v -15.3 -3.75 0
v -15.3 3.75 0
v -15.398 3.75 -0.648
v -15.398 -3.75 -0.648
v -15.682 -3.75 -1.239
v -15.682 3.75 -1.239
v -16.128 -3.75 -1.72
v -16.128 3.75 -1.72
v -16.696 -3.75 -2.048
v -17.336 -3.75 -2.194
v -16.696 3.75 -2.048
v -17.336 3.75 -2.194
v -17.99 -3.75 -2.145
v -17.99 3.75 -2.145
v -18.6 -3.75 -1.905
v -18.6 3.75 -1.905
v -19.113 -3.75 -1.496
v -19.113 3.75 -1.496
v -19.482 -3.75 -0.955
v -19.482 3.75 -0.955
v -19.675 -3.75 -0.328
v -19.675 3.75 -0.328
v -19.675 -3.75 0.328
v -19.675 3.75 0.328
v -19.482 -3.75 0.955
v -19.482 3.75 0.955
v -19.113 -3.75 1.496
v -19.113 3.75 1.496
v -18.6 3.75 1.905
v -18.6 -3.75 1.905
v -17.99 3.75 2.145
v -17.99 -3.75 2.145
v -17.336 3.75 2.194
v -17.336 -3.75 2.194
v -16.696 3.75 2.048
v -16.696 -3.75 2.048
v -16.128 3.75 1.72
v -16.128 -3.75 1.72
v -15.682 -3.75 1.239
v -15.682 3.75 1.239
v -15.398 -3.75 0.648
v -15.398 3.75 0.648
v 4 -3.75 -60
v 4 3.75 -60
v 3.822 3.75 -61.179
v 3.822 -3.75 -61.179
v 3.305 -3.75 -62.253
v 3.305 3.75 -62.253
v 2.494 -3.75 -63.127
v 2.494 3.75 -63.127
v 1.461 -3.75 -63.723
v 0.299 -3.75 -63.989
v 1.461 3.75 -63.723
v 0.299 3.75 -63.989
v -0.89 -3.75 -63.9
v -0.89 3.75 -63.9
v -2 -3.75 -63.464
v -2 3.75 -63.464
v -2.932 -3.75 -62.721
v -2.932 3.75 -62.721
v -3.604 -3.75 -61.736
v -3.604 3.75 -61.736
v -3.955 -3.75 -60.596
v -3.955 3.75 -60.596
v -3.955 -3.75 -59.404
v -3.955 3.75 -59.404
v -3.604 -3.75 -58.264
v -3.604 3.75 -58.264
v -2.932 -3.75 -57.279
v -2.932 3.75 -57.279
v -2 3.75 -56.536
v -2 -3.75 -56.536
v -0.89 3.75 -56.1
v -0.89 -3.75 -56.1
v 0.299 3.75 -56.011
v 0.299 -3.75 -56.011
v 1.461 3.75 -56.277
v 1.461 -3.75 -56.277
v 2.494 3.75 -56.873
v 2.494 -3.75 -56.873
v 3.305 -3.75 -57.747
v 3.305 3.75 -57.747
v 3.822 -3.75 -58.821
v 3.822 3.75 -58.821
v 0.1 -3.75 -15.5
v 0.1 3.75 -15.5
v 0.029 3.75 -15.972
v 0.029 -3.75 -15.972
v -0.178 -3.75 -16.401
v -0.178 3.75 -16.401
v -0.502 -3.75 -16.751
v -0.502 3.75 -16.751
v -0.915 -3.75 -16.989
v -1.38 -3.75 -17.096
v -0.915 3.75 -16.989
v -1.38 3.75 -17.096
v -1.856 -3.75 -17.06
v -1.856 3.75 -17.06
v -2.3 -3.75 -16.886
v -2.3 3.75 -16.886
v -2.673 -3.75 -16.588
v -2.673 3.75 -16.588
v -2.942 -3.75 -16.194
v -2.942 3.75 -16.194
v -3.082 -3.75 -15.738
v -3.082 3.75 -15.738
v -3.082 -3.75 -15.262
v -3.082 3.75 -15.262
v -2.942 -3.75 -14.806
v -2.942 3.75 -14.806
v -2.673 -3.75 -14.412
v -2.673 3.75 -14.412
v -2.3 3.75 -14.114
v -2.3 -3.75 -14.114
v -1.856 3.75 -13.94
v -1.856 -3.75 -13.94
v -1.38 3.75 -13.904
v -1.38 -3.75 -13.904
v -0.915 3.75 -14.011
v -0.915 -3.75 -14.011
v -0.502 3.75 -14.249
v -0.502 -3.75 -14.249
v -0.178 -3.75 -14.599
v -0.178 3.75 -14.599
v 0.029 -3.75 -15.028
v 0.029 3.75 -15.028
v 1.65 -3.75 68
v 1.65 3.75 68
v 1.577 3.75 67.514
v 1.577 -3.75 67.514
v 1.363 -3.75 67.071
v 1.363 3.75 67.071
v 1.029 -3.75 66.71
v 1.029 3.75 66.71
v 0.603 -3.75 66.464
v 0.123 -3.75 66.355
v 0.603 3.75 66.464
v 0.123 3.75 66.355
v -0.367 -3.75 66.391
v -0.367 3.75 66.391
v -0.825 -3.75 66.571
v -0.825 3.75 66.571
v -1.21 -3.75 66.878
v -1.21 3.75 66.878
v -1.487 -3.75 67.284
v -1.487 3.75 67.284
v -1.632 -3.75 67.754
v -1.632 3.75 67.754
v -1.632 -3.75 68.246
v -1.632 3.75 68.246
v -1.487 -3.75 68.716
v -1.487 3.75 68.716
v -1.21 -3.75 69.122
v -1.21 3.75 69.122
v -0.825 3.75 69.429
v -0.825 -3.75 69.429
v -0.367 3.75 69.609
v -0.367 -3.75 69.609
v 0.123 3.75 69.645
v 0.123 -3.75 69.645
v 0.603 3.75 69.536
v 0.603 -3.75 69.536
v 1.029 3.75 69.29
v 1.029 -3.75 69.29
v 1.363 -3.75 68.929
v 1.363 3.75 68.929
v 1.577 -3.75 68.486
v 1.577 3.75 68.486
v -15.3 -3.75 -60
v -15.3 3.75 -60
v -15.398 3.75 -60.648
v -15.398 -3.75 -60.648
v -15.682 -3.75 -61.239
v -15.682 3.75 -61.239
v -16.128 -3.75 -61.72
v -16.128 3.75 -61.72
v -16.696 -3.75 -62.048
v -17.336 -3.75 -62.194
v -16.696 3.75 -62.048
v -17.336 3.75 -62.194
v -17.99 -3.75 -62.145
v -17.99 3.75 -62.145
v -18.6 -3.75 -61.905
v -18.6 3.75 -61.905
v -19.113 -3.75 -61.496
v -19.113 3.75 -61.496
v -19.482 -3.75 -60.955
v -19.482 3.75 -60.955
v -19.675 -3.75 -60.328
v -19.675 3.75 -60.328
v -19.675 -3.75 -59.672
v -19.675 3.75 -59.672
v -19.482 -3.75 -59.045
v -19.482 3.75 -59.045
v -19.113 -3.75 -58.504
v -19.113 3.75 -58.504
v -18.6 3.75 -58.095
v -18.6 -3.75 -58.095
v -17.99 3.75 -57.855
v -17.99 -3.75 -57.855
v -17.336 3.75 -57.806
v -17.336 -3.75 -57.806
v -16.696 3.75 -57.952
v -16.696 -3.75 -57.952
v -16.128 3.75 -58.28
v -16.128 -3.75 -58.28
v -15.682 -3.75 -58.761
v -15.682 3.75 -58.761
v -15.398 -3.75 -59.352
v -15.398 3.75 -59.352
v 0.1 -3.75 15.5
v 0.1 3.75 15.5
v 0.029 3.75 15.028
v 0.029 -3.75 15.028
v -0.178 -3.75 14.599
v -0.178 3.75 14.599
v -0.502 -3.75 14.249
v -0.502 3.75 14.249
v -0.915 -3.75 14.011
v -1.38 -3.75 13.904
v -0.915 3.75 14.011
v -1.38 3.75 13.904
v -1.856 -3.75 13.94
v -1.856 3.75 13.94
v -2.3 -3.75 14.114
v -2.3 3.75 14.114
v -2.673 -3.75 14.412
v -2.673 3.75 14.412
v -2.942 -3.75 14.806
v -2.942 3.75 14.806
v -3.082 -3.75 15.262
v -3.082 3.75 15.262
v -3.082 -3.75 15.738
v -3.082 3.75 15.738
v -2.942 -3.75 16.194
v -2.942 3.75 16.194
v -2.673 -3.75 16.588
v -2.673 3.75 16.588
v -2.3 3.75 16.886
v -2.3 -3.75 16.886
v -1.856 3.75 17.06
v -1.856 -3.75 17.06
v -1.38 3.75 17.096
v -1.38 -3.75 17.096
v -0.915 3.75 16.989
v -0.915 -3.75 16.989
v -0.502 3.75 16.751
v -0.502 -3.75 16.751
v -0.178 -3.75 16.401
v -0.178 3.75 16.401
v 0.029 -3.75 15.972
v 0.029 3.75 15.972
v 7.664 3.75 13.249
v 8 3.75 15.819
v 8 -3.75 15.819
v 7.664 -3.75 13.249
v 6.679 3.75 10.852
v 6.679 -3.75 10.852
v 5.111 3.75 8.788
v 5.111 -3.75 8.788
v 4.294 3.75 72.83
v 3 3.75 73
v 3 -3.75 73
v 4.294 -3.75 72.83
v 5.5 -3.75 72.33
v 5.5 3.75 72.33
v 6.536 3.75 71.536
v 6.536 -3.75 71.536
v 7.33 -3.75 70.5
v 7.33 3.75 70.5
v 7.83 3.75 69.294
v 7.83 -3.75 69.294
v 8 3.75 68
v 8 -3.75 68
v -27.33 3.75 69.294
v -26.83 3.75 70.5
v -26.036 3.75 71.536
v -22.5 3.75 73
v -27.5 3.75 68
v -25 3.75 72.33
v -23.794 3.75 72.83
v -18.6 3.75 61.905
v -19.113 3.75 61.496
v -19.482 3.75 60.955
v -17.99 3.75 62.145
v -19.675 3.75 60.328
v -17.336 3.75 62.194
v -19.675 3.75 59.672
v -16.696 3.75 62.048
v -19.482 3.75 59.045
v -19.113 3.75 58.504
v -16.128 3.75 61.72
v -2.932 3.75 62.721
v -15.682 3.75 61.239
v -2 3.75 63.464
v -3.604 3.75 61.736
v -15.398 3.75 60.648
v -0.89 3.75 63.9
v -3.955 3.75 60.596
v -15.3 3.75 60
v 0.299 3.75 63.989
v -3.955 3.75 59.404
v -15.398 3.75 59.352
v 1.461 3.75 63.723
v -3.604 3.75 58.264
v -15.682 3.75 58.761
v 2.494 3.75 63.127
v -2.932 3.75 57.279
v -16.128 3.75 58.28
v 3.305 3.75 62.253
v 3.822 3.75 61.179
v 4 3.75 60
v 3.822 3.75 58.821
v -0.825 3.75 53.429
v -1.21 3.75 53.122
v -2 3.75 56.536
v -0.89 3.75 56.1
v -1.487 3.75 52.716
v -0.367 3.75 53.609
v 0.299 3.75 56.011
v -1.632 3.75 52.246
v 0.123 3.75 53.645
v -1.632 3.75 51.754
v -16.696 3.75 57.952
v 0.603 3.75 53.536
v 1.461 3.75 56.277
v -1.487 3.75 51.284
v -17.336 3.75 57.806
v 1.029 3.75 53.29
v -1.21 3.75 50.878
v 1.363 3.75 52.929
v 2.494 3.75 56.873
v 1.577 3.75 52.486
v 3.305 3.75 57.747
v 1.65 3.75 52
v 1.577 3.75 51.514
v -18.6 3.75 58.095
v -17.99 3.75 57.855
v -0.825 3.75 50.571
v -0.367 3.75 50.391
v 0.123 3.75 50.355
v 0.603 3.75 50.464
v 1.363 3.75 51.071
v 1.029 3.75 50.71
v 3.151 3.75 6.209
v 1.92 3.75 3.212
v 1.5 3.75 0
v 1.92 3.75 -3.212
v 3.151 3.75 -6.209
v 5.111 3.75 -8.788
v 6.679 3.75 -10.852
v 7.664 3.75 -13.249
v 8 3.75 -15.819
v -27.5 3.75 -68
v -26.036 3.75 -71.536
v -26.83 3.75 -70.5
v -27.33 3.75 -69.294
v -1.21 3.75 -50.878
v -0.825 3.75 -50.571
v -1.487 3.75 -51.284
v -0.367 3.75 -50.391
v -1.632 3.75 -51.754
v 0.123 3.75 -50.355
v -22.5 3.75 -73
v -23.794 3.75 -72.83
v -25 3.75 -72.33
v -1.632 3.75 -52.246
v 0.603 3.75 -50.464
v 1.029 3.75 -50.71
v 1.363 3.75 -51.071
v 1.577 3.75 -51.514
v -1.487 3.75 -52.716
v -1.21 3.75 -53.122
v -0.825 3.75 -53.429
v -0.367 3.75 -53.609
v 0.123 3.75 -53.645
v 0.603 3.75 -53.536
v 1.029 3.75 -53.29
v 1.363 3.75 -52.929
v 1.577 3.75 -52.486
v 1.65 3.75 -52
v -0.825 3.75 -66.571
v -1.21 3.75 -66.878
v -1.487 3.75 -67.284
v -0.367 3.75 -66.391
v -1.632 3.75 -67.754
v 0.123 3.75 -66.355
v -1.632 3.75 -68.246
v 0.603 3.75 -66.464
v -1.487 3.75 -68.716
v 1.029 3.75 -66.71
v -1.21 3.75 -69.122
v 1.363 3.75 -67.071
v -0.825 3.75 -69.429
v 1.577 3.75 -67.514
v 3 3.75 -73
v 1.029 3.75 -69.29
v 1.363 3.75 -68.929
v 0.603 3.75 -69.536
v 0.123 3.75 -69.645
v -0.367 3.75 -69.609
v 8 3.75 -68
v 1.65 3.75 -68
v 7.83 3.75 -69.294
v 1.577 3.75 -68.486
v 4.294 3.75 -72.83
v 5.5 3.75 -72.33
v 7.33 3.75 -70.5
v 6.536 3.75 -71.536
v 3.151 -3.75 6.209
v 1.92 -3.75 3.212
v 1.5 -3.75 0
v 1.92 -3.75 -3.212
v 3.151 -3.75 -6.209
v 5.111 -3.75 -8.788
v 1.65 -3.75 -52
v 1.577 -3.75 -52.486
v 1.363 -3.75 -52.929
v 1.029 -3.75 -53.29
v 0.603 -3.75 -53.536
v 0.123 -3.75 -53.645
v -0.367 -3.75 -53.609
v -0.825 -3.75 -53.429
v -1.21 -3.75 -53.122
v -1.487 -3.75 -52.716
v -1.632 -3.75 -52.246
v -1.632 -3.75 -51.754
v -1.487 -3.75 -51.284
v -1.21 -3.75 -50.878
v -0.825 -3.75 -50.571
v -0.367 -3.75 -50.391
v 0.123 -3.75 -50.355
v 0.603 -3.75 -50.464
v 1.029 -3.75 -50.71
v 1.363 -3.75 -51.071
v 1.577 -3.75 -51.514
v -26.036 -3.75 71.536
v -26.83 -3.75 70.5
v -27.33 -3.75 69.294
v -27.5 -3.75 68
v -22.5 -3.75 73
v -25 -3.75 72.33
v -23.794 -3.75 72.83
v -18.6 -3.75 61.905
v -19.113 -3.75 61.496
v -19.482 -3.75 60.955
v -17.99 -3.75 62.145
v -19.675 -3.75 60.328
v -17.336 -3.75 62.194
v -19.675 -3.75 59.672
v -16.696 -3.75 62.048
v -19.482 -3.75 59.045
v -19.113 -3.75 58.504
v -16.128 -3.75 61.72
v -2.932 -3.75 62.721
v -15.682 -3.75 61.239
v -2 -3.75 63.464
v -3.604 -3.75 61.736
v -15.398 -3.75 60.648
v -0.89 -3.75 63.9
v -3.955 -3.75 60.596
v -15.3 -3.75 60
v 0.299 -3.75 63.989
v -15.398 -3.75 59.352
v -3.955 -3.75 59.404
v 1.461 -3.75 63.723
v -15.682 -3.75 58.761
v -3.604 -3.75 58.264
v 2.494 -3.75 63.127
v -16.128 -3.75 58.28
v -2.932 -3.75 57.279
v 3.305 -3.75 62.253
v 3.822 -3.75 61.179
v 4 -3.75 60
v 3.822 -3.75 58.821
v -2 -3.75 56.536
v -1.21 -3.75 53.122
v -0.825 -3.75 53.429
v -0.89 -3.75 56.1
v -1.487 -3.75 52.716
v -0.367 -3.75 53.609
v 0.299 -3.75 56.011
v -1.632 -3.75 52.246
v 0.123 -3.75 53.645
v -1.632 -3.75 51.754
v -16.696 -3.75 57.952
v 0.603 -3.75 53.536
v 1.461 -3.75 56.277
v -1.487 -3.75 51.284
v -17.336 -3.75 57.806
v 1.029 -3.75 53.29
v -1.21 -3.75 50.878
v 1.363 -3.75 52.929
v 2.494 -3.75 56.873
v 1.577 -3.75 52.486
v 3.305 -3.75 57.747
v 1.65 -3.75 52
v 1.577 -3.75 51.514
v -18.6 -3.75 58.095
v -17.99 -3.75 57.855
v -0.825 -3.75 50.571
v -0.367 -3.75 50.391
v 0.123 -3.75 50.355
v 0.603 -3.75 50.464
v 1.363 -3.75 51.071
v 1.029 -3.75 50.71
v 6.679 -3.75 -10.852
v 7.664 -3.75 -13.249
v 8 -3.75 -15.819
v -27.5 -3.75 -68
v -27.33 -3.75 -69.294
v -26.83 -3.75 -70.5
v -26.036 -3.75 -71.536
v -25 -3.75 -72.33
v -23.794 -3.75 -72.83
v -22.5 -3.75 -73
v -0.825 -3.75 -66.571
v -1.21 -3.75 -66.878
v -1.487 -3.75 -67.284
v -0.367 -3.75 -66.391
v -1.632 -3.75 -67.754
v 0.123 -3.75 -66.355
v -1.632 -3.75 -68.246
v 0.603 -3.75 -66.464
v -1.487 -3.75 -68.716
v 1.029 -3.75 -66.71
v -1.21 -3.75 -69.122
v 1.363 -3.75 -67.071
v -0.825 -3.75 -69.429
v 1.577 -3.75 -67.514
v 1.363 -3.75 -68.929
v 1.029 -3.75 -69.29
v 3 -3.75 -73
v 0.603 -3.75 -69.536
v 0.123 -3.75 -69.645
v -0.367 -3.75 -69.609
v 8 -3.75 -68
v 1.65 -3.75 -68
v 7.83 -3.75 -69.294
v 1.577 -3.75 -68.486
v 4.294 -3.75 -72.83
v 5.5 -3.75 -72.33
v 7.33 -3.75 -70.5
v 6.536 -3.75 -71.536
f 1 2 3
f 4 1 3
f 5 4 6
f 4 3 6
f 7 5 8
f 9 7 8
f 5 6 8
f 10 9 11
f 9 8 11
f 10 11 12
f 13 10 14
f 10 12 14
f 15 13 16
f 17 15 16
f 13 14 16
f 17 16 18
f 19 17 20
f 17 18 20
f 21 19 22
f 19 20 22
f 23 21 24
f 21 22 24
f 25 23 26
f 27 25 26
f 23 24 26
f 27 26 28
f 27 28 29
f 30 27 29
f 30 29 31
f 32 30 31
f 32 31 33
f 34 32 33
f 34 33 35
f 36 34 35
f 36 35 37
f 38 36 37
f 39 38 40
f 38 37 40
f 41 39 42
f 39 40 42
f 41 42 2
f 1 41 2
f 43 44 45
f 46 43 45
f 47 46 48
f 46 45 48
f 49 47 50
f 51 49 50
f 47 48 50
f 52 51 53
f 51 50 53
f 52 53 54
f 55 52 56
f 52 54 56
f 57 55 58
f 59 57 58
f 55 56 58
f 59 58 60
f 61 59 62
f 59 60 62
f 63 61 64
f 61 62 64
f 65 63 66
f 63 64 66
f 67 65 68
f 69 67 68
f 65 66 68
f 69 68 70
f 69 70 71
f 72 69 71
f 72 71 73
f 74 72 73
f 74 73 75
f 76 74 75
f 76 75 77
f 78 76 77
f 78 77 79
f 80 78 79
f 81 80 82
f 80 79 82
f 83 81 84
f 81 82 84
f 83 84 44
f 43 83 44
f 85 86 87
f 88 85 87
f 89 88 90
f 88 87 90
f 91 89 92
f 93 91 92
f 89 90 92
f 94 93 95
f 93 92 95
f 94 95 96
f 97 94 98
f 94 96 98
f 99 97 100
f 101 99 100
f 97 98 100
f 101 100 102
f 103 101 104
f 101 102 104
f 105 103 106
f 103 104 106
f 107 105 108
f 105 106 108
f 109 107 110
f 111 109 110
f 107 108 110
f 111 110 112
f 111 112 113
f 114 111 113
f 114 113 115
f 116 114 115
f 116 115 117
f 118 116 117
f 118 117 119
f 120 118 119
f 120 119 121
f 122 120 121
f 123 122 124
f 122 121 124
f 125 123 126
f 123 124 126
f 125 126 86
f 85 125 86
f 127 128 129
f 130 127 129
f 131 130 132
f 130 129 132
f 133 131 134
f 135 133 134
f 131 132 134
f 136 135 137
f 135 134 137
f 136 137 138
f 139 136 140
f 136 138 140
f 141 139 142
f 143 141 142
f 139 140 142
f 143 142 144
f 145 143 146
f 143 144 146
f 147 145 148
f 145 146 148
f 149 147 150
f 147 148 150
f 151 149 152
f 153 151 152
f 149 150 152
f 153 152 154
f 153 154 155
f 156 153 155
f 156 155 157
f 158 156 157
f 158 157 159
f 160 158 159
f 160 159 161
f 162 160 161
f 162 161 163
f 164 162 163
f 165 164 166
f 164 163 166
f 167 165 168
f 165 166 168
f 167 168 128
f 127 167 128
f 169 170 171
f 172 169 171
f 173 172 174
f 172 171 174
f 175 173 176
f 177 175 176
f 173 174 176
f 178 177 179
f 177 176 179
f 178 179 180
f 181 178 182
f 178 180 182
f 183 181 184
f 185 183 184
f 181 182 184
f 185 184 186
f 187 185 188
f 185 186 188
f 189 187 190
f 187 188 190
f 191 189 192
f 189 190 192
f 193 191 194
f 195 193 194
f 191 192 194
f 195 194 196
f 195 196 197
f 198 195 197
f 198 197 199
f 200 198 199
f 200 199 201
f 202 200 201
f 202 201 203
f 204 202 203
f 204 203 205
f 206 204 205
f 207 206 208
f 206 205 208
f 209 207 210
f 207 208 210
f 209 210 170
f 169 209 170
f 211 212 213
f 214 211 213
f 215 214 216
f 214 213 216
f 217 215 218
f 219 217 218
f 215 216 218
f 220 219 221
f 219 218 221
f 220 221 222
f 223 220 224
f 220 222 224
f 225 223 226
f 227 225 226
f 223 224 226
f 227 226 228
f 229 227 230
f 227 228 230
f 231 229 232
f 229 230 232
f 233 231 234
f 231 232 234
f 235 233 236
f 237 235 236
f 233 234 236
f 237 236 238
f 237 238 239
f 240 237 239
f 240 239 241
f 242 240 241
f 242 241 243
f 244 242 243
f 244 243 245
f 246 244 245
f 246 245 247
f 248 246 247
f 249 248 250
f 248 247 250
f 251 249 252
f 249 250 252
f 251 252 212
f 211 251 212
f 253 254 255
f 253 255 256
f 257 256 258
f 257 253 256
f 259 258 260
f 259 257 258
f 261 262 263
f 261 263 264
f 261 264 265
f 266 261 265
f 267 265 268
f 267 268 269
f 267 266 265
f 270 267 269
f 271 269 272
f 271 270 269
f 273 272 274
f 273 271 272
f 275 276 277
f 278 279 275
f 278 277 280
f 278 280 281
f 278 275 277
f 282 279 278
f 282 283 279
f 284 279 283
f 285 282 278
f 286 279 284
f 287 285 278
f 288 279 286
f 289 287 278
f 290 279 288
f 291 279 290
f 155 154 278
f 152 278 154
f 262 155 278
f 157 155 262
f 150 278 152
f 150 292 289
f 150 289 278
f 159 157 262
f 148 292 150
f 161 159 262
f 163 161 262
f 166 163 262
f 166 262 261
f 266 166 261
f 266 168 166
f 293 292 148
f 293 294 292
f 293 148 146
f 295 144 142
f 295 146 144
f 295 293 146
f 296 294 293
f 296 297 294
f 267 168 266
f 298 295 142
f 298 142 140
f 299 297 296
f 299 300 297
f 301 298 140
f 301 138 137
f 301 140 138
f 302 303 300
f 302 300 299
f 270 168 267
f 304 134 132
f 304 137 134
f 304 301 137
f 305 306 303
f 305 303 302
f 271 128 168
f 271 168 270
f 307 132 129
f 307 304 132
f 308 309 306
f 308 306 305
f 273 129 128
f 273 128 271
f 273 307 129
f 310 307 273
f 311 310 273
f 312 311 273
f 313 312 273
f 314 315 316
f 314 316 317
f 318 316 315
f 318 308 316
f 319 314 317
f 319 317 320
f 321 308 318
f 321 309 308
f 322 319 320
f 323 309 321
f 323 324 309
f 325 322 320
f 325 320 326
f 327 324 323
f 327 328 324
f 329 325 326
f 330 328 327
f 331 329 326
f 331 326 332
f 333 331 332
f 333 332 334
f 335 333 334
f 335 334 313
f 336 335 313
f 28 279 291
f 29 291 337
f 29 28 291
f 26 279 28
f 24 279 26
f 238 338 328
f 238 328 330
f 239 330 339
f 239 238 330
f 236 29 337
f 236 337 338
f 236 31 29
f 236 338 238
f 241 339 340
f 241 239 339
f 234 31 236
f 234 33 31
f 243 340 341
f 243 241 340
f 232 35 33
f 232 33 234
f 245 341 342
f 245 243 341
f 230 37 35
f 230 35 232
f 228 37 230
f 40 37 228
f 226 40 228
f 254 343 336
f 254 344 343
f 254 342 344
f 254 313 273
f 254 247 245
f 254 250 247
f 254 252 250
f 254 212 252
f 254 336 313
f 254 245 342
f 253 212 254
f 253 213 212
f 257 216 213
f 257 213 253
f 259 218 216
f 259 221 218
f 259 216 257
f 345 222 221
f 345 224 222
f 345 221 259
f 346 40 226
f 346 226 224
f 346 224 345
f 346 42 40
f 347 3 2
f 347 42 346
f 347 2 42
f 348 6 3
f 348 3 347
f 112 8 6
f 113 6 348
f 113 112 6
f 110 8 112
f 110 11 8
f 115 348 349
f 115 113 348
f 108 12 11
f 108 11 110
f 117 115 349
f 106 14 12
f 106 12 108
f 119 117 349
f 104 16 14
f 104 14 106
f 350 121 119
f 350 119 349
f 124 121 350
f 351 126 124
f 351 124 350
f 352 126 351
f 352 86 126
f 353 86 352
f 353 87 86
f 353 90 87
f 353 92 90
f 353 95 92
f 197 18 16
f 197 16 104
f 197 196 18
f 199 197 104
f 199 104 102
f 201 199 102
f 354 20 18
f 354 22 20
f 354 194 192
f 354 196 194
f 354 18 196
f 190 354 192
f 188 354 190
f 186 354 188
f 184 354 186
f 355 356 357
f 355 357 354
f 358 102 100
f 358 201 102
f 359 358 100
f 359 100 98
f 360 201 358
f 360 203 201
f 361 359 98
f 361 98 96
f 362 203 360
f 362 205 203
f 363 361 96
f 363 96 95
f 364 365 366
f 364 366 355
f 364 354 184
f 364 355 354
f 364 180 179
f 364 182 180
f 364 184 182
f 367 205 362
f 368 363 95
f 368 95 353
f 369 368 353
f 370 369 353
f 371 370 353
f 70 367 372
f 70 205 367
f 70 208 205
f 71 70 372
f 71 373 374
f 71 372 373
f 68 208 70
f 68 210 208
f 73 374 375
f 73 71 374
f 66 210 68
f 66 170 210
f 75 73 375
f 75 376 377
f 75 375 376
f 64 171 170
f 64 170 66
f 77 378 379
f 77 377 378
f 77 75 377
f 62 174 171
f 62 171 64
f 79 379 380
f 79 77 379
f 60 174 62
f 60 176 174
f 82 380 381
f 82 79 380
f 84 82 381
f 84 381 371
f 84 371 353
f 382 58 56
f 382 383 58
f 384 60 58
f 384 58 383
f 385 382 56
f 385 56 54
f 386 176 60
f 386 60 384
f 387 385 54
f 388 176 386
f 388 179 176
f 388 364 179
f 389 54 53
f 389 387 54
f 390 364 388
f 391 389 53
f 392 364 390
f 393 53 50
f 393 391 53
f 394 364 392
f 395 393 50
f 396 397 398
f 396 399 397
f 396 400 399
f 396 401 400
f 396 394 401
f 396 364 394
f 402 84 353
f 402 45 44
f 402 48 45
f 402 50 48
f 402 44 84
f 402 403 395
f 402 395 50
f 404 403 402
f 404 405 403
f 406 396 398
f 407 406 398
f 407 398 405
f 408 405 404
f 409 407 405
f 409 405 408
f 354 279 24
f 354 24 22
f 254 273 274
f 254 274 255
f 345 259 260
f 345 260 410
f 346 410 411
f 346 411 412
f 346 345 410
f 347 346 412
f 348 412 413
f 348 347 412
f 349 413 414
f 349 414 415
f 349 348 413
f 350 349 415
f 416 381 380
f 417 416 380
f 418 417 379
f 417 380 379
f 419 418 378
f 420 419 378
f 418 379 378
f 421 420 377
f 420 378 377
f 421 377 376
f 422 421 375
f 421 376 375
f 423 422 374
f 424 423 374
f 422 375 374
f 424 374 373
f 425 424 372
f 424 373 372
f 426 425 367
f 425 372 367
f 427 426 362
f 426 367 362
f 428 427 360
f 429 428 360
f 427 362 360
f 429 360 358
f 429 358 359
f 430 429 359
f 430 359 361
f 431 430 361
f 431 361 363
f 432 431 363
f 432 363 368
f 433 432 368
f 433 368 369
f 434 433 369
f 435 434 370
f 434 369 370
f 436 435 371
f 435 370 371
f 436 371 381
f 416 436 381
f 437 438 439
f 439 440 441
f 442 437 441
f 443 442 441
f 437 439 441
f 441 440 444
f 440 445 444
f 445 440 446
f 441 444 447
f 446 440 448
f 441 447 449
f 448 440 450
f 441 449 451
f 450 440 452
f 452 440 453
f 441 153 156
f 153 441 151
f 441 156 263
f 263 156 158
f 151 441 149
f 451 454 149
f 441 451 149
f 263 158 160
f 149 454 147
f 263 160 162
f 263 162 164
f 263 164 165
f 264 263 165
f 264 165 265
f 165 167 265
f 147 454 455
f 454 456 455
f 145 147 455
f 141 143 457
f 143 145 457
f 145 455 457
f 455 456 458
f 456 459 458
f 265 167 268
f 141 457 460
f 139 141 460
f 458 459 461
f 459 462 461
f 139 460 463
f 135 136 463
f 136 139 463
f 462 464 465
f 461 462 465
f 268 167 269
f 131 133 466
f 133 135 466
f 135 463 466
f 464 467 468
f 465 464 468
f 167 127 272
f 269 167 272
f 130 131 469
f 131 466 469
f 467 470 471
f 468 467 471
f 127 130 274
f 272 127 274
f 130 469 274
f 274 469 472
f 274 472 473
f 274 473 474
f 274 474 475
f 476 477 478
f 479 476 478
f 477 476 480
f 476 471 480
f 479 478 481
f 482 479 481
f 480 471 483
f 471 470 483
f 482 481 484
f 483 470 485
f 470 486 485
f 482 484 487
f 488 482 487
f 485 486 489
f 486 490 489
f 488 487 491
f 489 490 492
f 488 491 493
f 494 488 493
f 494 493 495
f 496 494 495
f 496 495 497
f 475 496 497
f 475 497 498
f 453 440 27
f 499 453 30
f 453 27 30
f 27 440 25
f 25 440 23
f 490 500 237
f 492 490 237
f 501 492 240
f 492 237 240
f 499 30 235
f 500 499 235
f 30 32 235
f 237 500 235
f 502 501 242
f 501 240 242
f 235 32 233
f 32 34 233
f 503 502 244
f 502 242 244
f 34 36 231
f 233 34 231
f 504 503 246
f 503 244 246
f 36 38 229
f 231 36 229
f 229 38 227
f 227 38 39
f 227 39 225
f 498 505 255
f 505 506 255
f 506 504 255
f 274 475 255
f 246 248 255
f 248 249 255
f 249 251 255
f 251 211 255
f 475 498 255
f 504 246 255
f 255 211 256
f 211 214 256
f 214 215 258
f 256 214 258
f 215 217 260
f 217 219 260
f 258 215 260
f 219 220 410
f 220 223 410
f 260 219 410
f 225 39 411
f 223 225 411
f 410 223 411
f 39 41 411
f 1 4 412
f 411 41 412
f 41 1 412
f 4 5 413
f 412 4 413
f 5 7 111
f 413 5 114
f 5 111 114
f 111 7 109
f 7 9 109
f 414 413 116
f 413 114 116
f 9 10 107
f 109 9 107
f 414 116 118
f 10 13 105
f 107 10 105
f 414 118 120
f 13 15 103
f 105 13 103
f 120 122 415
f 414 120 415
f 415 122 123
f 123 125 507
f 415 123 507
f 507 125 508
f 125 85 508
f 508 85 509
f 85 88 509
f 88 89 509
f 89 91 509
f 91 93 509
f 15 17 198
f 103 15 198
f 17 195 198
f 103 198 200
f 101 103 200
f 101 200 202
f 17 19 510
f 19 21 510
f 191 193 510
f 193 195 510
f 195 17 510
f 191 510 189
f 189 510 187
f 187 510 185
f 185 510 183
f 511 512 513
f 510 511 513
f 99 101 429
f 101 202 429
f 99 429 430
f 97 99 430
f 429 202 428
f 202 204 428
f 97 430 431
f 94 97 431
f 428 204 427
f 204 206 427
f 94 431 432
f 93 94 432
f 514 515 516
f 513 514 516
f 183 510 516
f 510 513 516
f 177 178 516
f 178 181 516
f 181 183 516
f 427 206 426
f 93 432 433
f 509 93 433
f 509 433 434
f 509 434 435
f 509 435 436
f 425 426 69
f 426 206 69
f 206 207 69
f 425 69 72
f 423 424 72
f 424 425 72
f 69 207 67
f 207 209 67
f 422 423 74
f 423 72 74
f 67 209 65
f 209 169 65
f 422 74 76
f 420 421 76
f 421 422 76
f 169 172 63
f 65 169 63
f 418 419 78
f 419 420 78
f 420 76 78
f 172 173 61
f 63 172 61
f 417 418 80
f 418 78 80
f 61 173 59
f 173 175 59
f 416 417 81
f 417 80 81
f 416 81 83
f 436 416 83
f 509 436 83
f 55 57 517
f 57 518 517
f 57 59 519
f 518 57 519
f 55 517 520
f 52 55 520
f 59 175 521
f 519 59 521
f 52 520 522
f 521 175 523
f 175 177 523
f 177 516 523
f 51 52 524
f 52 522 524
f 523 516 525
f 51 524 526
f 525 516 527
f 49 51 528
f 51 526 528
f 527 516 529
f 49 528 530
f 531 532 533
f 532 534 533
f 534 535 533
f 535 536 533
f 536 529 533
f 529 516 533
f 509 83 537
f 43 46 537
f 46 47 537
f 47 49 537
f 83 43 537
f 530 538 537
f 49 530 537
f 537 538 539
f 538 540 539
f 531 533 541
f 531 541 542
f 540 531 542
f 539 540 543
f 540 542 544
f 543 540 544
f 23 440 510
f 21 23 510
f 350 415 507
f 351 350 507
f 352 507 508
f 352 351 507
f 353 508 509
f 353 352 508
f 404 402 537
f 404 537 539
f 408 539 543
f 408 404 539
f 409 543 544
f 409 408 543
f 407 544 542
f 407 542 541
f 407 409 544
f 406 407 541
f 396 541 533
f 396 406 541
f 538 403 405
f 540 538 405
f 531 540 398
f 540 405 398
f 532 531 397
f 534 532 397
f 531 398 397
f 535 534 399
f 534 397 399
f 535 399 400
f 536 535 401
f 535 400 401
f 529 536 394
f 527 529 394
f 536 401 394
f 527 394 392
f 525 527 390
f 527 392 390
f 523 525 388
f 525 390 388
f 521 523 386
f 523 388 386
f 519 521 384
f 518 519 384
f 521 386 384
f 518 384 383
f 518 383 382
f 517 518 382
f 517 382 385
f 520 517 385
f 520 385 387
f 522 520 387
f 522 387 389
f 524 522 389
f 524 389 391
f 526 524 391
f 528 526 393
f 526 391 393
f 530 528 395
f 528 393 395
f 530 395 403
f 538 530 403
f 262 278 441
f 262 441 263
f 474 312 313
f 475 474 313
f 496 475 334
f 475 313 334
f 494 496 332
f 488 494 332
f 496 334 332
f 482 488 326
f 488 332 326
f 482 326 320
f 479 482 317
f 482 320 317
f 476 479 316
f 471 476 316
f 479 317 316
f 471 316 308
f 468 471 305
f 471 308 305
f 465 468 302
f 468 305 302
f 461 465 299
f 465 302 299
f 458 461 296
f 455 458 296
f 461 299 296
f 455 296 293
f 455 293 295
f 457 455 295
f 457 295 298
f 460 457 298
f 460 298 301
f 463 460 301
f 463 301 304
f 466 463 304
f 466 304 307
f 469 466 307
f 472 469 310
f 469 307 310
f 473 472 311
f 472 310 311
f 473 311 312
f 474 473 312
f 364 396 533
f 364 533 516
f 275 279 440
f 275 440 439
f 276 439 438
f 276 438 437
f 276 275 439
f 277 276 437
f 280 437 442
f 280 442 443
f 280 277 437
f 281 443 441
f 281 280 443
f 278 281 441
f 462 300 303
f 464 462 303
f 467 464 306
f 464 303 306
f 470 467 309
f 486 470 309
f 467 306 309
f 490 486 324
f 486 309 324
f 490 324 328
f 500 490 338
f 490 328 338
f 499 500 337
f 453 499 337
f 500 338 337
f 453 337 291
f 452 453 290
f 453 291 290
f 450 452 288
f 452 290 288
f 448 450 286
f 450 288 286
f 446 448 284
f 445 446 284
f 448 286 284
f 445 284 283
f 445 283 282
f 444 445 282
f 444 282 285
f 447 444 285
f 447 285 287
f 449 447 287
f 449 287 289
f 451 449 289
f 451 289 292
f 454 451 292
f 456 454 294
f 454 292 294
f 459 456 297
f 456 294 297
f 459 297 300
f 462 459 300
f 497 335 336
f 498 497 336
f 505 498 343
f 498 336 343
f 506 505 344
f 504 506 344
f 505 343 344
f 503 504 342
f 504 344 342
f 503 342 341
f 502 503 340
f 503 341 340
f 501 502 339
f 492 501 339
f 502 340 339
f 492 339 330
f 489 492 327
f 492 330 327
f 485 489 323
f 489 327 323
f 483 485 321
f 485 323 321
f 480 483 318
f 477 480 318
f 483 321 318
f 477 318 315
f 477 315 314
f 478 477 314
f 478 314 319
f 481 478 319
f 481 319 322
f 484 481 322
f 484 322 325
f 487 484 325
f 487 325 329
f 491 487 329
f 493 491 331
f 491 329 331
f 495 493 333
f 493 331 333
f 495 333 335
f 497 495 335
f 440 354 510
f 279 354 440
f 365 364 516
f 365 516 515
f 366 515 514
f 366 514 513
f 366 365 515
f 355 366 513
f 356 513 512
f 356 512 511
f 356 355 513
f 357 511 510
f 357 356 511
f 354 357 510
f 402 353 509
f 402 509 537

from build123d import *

# Parameters (mm, degrees)
SKETCH1_R           = 1.65
SKETCH1_R_2         = 1.6
SKETCH1_R_3         = 2.2
SKETCH1_R_4         = 4
BOSS_EXTRUDE1_DEPTH = 7.5


with BuildPart() as part:
    # Sketch1 → Boss-Extrude1 (new body)
    with BuildSketch(Plane(origin=(0, 3.75, 0), x_dir=(1, 0, 0), z_dir=(0, 1, 0))):
        with BuildLine():
            Line((8, -68), (8, -15.81929202))
            ThreePointArc((8, -15.81929202), (7.249624617, -12.018707269), (5.111111111, -8.788495566))
            ThreePointArc((5.111111111, -8.788495566), (1.5, 0), (5.111111111, 8.788495566))
            ThreePointArc((5.111111111, 8.788495566), (7.249624617, 12.018707269), (8, 15.81929202))
            Line((8, 15.81929202), (8, 68))
            ThreePointArc((8, 68), (6.535533906, 71.535533906), (3, 73))
            Line((3, 73), (-22.5, 73))
            ThreePointArc((-22.5, 73), (-26.035533906, 71.535533906), (-27.5, 68))
            Line((-27.5, 68), (-27.5, -68))
            ThreePointArc((-27.5, -68), (-26.035533906, -71.535533906), (-22.5, -73))
            Line((-22.5, -73), (3, -73))
            ThreePointArc((3, -73), (6.535533906, -71.535533906), (8, -68))
        make_face()
        with Locations((0, -68)):
            Circle(SKETCH1_R, mode=Mode.SUBTRACT)
        with Locations((0, -52)):
            Circle(SKETCH1_R, mode=Mode.SUBTRACT)
        with Locations((0, 68)):
            Circle(SKETCH1_R, mode=Mode.SUBTRACT)
        with Locations((0, 52)):
            Circle(SKETCH1_R, mode=Mode.SUBTRACT)
        with Locations((-1.5, 15.5)):
            Circle(SKETCH1_R_2, mode=Mode.SUBTRACT)
        with Locations((-1.5, -15.5)):
            Circle(SKETCH1_R_2, mode=Mode.SUBTRACT)
        with Locations((-17.5, 0)):
            Circle(SKETCH1_R_3, mode=Mode.SUBTRACT)
        with Locations((0, -60)):
            Circle(SKETCH1_R_4, mode=Mode.SUBTRACT)
        with Locations((0, 60)):
            Circle(SKETCH1_R_4, mode=Mode.SUBTRACT)
        with Locations((-17.5, 60)):
            Circle(SKETCH1_R_3, mode=Mode.SUBTRACT)
        with Locations((-17.5, -60)):
            Circle(SKETCH1_R_3, mode=Mode.SUBTRACT)
    extrude(amount=-BOSS_EXTRUDE1_DEPTH)


solid = part.part
